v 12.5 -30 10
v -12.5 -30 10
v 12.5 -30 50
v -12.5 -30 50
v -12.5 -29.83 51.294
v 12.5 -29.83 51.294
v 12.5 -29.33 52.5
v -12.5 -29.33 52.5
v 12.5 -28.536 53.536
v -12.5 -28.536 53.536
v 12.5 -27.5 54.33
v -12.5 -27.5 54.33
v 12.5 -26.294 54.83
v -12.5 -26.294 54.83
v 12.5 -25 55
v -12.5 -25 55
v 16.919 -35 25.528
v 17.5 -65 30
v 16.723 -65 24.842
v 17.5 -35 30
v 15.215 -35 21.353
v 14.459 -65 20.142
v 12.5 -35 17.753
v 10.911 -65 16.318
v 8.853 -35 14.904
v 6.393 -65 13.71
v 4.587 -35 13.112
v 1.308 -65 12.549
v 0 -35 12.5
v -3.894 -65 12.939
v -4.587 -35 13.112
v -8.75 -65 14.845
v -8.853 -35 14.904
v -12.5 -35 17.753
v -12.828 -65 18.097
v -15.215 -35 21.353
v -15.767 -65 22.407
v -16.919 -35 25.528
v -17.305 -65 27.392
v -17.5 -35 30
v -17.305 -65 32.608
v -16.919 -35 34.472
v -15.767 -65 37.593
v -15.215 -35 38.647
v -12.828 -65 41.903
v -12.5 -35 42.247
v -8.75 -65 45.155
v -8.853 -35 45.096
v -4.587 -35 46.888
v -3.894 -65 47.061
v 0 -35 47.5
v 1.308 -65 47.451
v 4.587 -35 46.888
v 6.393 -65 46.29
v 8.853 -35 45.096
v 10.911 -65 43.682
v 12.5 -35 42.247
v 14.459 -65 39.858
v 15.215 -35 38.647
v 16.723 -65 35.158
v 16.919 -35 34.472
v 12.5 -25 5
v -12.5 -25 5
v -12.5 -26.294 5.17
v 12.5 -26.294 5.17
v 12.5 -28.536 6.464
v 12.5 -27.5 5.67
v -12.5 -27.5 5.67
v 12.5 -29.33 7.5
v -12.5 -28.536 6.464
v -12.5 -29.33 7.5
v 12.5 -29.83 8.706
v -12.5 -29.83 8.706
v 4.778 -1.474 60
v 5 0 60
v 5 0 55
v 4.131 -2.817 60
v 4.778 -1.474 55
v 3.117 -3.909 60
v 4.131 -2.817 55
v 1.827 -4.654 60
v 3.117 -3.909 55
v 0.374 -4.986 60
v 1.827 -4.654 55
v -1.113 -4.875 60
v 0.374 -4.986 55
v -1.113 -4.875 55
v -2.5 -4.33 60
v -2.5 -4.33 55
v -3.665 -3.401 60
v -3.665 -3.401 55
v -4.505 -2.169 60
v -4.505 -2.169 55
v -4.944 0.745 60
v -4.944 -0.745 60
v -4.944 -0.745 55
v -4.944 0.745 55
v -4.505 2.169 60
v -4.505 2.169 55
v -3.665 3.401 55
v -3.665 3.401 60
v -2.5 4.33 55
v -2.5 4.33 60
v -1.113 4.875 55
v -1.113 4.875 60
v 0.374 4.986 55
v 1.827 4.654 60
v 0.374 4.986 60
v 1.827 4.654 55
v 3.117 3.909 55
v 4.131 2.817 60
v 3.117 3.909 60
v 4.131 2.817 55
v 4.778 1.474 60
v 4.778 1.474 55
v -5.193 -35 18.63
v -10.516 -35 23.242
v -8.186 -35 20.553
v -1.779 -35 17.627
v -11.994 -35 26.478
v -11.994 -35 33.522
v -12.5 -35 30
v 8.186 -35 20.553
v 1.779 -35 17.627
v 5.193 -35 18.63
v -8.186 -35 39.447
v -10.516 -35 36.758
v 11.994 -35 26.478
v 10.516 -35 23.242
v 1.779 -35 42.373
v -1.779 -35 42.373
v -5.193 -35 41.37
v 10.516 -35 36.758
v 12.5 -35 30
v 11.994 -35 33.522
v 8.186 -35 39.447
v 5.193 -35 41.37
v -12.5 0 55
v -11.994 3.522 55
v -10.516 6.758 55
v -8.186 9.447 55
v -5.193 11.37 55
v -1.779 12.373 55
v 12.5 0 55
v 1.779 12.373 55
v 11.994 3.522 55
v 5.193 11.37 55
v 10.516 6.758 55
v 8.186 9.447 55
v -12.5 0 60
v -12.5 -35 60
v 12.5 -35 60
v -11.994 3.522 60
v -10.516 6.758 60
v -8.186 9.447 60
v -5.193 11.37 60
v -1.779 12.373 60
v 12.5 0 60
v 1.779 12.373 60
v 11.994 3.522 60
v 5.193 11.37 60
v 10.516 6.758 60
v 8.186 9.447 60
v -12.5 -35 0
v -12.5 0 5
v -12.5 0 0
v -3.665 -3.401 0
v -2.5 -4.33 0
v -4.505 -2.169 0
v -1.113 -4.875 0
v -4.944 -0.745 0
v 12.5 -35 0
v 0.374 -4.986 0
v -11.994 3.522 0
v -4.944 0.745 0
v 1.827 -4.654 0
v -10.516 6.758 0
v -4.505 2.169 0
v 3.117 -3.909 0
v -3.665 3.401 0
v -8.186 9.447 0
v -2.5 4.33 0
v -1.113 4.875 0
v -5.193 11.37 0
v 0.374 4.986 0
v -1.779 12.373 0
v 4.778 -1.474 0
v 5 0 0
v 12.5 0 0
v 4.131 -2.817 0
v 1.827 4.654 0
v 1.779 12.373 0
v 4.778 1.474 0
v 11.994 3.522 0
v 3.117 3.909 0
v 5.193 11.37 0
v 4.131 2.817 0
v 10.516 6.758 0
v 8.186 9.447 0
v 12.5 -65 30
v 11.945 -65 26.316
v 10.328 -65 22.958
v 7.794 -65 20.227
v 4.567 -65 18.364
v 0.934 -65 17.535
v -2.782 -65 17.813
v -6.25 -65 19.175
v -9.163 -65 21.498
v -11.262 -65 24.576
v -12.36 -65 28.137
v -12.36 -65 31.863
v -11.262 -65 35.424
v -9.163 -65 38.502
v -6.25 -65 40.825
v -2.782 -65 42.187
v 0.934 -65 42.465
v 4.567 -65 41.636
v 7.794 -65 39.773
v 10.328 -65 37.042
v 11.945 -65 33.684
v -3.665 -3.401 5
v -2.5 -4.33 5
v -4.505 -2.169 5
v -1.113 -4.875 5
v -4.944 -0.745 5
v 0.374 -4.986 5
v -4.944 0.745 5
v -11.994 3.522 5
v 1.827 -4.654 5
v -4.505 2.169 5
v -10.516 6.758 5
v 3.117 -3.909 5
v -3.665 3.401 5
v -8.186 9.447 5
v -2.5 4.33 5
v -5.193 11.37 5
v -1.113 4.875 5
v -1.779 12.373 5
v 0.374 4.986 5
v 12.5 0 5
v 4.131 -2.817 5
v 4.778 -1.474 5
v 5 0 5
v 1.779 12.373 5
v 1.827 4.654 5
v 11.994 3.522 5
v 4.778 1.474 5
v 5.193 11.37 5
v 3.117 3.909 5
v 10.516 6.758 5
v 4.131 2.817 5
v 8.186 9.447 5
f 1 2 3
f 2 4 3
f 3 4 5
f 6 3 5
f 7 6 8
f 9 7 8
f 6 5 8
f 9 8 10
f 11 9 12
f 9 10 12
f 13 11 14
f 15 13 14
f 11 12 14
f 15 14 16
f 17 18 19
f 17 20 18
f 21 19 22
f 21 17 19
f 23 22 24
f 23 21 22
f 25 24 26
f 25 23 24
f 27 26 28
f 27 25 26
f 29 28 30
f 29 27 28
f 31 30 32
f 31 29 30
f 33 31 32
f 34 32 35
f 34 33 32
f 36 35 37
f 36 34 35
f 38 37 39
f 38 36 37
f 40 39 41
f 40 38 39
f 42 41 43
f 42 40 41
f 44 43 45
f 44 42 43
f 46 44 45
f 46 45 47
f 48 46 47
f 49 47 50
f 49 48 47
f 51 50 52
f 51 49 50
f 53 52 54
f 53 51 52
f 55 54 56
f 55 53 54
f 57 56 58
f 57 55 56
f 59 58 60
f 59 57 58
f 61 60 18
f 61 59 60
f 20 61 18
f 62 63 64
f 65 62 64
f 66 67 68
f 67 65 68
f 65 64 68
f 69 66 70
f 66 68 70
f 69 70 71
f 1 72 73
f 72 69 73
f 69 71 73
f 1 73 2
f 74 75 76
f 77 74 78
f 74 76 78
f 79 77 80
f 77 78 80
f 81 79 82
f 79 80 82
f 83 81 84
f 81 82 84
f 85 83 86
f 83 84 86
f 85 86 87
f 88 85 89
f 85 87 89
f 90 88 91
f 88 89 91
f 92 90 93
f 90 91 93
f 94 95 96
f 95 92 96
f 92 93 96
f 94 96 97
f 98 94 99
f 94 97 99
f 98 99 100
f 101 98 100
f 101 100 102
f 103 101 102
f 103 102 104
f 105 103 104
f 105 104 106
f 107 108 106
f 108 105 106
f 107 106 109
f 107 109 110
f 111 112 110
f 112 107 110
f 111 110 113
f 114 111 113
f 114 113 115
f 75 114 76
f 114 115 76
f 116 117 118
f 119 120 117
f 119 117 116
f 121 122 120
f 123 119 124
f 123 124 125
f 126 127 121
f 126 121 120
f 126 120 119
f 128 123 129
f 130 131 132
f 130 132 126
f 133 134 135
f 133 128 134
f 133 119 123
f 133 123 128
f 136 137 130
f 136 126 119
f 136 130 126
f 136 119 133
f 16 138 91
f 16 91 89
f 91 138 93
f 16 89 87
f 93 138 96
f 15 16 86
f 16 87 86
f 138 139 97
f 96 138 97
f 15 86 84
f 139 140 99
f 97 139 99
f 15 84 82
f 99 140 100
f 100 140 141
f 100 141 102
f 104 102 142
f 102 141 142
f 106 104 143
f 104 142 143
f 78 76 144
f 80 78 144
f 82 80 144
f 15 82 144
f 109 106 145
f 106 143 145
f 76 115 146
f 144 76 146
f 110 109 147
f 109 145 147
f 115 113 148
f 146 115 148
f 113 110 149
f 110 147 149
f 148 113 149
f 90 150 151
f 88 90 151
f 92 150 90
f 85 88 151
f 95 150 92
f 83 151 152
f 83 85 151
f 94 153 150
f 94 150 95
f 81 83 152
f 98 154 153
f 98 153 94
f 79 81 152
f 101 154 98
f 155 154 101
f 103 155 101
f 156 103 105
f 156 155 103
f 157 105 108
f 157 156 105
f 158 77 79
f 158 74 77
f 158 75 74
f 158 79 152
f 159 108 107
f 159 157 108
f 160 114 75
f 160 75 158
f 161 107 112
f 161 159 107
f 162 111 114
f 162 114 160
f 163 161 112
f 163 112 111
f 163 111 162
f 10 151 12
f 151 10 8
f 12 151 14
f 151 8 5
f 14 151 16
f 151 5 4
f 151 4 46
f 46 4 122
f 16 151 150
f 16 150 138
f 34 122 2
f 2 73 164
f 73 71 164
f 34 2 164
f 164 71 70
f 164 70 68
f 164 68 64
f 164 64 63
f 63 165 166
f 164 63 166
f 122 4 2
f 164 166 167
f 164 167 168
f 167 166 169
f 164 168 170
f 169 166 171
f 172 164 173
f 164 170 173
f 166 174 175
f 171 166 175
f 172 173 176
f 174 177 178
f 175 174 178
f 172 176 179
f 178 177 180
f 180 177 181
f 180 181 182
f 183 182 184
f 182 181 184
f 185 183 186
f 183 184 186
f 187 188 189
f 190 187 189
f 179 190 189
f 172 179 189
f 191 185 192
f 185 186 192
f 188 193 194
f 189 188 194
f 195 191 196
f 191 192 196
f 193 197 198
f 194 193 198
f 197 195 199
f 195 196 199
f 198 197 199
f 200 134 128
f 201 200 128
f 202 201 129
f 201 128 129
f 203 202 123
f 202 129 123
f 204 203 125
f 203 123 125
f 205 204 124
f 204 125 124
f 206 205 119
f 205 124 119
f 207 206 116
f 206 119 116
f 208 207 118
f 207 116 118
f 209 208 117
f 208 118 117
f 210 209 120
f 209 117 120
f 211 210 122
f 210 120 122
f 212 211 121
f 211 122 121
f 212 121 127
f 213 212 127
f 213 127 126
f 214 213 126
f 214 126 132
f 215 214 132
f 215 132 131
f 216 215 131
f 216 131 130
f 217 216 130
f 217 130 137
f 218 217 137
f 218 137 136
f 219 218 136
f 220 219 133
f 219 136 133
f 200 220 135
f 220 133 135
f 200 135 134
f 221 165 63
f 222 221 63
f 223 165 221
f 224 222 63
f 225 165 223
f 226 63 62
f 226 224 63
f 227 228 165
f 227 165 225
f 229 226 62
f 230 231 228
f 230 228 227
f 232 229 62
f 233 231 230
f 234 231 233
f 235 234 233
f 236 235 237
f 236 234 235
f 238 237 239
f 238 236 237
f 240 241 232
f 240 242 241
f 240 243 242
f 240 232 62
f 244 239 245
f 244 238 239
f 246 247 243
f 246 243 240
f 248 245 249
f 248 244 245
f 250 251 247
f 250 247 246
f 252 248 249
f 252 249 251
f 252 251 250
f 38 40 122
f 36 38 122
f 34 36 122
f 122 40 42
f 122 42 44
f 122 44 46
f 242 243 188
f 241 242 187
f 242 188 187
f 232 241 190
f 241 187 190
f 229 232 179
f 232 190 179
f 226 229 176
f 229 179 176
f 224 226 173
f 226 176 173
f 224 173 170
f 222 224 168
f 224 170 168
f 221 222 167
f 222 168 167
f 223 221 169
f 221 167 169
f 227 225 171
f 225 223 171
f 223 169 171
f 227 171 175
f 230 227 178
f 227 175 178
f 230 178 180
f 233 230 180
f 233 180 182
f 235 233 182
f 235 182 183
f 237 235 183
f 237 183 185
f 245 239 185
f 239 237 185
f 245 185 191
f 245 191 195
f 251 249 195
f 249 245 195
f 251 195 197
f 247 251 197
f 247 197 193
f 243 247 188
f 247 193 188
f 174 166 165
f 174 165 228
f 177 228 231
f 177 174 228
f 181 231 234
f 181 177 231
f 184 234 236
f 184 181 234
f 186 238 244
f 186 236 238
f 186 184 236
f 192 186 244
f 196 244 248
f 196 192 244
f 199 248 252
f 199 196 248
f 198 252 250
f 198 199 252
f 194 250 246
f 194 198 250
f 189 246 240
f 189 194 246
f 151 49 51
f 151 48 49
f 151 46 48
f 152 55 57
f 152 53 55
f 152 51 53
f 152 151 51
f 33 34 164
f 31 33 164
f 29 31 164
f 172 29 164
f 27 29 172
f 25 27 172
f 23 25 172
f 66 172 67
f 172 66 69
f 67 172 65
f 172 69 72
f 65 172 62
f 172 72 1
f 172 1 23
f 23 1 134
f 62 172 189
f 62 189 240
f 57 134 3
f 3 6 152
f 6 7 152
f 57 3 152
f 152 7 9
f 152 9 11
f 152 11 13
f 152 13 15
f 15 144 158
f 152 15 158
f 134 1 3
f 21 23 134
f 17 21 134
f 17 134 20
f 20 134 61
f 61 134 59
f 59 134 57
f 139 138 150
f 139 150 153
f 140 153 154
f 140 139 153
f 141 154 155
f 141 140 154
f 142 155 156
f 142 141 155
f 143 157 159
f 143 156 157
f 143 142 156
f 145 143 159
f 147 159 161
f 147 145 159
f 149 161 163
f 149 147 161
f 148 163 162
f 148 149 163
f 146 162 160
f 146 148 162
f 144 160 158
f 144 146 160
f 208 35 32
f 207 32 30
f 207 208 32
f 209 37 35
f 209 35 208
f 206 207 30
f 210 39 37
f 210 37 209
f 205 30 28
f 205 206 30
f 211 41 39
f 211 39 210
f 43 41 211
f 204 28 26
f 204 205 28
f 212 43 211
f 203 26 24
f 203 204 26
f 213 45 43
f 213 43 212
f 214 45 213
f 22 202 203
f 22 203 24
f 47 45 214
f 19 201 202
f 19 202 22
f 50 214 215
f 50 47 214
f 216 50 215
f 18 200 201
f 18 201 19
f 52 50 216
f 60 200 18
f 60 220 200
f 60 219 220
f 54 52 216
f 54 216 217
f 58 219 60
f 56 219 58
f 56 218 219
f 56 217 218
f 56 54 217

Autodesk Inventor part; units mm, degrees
ref_plane "YZ Plane" through (0, 0, 0) normal (1, 0, 0) x (0, 1, 0)
ref_plane "XZ Plane" through (0, 0, 0) normal (0, 1, 0) x (-1, 0, 0)
ref_plane "XY Plane" through (0, 0, 0) normal (0, 0, 1) x (1, 0, 0)
sketch "Sketch1" plane through (0, 0, 0) normal (0, 0, 1) x (1, 0, 0)
  circle A0 centre (0, 0) radius 5
  circle A1 centre (0, 0) radius 12.5
  line L0 (-12.5, 0) -> (12.5, 0)
  line L1 (12.5, 0) -> (12.5, -30)
  line L2 (12.5, -30) -> (-12.5, -30)
  line L3 (-12.5, -30) -> (-12.5, 0)
  dimension "d1" = 25
  dimension "d0" = 10
  dimension "d2" = 25
  dimension "d3" = 30
extrude "Extrusion1" add sketch "Sketch1" along normal blind 5 contours L0 A1 A0 | A0 L0 A1 | L1 L2 L3 A1
pattern_linear "Rectangular Pattern1" count 2 spacing 55 along (0, 0, 1) of "Extrusion1"
sketch "Sketch2" plane through (-12.5, -30, 55) normal (0, -1, 0) x (1, 0, 0)
  line L0 (0, 5) -> (25, 5) projected
  line L1 (25, 5) -> (0, 5)
  line L2 (0, 5) -> (0, -55)
  line L3 (0, -55) -> (25, -55)
  line L4 (25, -55) -> (25, 5)
  point P0 (12.5, -55)
extrude "Extrusion2" add sketch "Sketch2" along normal blind 5
fillet "Fillet1" radius 5 2 edges at (0, -30, 5) (0, -30, 55)
sketch "Sketch3" plane through (-12.5, -35, 55) normal (0, -1, 0) x (1, 0, 0)
  circle A0 centre (12.5, -25) radius 17.5
  circle A1 centre (12.5, -25) radius 12.5
  line L0 (0, -55) -> (25, -55) projected
  point P0 (12.5, -55)
  dimension "d12" = 35
  dimension "d15" = 30
extrude "Extrusion3" add sketch "Sketch3" along normal blind 30
properties part number "uJoint.1"
